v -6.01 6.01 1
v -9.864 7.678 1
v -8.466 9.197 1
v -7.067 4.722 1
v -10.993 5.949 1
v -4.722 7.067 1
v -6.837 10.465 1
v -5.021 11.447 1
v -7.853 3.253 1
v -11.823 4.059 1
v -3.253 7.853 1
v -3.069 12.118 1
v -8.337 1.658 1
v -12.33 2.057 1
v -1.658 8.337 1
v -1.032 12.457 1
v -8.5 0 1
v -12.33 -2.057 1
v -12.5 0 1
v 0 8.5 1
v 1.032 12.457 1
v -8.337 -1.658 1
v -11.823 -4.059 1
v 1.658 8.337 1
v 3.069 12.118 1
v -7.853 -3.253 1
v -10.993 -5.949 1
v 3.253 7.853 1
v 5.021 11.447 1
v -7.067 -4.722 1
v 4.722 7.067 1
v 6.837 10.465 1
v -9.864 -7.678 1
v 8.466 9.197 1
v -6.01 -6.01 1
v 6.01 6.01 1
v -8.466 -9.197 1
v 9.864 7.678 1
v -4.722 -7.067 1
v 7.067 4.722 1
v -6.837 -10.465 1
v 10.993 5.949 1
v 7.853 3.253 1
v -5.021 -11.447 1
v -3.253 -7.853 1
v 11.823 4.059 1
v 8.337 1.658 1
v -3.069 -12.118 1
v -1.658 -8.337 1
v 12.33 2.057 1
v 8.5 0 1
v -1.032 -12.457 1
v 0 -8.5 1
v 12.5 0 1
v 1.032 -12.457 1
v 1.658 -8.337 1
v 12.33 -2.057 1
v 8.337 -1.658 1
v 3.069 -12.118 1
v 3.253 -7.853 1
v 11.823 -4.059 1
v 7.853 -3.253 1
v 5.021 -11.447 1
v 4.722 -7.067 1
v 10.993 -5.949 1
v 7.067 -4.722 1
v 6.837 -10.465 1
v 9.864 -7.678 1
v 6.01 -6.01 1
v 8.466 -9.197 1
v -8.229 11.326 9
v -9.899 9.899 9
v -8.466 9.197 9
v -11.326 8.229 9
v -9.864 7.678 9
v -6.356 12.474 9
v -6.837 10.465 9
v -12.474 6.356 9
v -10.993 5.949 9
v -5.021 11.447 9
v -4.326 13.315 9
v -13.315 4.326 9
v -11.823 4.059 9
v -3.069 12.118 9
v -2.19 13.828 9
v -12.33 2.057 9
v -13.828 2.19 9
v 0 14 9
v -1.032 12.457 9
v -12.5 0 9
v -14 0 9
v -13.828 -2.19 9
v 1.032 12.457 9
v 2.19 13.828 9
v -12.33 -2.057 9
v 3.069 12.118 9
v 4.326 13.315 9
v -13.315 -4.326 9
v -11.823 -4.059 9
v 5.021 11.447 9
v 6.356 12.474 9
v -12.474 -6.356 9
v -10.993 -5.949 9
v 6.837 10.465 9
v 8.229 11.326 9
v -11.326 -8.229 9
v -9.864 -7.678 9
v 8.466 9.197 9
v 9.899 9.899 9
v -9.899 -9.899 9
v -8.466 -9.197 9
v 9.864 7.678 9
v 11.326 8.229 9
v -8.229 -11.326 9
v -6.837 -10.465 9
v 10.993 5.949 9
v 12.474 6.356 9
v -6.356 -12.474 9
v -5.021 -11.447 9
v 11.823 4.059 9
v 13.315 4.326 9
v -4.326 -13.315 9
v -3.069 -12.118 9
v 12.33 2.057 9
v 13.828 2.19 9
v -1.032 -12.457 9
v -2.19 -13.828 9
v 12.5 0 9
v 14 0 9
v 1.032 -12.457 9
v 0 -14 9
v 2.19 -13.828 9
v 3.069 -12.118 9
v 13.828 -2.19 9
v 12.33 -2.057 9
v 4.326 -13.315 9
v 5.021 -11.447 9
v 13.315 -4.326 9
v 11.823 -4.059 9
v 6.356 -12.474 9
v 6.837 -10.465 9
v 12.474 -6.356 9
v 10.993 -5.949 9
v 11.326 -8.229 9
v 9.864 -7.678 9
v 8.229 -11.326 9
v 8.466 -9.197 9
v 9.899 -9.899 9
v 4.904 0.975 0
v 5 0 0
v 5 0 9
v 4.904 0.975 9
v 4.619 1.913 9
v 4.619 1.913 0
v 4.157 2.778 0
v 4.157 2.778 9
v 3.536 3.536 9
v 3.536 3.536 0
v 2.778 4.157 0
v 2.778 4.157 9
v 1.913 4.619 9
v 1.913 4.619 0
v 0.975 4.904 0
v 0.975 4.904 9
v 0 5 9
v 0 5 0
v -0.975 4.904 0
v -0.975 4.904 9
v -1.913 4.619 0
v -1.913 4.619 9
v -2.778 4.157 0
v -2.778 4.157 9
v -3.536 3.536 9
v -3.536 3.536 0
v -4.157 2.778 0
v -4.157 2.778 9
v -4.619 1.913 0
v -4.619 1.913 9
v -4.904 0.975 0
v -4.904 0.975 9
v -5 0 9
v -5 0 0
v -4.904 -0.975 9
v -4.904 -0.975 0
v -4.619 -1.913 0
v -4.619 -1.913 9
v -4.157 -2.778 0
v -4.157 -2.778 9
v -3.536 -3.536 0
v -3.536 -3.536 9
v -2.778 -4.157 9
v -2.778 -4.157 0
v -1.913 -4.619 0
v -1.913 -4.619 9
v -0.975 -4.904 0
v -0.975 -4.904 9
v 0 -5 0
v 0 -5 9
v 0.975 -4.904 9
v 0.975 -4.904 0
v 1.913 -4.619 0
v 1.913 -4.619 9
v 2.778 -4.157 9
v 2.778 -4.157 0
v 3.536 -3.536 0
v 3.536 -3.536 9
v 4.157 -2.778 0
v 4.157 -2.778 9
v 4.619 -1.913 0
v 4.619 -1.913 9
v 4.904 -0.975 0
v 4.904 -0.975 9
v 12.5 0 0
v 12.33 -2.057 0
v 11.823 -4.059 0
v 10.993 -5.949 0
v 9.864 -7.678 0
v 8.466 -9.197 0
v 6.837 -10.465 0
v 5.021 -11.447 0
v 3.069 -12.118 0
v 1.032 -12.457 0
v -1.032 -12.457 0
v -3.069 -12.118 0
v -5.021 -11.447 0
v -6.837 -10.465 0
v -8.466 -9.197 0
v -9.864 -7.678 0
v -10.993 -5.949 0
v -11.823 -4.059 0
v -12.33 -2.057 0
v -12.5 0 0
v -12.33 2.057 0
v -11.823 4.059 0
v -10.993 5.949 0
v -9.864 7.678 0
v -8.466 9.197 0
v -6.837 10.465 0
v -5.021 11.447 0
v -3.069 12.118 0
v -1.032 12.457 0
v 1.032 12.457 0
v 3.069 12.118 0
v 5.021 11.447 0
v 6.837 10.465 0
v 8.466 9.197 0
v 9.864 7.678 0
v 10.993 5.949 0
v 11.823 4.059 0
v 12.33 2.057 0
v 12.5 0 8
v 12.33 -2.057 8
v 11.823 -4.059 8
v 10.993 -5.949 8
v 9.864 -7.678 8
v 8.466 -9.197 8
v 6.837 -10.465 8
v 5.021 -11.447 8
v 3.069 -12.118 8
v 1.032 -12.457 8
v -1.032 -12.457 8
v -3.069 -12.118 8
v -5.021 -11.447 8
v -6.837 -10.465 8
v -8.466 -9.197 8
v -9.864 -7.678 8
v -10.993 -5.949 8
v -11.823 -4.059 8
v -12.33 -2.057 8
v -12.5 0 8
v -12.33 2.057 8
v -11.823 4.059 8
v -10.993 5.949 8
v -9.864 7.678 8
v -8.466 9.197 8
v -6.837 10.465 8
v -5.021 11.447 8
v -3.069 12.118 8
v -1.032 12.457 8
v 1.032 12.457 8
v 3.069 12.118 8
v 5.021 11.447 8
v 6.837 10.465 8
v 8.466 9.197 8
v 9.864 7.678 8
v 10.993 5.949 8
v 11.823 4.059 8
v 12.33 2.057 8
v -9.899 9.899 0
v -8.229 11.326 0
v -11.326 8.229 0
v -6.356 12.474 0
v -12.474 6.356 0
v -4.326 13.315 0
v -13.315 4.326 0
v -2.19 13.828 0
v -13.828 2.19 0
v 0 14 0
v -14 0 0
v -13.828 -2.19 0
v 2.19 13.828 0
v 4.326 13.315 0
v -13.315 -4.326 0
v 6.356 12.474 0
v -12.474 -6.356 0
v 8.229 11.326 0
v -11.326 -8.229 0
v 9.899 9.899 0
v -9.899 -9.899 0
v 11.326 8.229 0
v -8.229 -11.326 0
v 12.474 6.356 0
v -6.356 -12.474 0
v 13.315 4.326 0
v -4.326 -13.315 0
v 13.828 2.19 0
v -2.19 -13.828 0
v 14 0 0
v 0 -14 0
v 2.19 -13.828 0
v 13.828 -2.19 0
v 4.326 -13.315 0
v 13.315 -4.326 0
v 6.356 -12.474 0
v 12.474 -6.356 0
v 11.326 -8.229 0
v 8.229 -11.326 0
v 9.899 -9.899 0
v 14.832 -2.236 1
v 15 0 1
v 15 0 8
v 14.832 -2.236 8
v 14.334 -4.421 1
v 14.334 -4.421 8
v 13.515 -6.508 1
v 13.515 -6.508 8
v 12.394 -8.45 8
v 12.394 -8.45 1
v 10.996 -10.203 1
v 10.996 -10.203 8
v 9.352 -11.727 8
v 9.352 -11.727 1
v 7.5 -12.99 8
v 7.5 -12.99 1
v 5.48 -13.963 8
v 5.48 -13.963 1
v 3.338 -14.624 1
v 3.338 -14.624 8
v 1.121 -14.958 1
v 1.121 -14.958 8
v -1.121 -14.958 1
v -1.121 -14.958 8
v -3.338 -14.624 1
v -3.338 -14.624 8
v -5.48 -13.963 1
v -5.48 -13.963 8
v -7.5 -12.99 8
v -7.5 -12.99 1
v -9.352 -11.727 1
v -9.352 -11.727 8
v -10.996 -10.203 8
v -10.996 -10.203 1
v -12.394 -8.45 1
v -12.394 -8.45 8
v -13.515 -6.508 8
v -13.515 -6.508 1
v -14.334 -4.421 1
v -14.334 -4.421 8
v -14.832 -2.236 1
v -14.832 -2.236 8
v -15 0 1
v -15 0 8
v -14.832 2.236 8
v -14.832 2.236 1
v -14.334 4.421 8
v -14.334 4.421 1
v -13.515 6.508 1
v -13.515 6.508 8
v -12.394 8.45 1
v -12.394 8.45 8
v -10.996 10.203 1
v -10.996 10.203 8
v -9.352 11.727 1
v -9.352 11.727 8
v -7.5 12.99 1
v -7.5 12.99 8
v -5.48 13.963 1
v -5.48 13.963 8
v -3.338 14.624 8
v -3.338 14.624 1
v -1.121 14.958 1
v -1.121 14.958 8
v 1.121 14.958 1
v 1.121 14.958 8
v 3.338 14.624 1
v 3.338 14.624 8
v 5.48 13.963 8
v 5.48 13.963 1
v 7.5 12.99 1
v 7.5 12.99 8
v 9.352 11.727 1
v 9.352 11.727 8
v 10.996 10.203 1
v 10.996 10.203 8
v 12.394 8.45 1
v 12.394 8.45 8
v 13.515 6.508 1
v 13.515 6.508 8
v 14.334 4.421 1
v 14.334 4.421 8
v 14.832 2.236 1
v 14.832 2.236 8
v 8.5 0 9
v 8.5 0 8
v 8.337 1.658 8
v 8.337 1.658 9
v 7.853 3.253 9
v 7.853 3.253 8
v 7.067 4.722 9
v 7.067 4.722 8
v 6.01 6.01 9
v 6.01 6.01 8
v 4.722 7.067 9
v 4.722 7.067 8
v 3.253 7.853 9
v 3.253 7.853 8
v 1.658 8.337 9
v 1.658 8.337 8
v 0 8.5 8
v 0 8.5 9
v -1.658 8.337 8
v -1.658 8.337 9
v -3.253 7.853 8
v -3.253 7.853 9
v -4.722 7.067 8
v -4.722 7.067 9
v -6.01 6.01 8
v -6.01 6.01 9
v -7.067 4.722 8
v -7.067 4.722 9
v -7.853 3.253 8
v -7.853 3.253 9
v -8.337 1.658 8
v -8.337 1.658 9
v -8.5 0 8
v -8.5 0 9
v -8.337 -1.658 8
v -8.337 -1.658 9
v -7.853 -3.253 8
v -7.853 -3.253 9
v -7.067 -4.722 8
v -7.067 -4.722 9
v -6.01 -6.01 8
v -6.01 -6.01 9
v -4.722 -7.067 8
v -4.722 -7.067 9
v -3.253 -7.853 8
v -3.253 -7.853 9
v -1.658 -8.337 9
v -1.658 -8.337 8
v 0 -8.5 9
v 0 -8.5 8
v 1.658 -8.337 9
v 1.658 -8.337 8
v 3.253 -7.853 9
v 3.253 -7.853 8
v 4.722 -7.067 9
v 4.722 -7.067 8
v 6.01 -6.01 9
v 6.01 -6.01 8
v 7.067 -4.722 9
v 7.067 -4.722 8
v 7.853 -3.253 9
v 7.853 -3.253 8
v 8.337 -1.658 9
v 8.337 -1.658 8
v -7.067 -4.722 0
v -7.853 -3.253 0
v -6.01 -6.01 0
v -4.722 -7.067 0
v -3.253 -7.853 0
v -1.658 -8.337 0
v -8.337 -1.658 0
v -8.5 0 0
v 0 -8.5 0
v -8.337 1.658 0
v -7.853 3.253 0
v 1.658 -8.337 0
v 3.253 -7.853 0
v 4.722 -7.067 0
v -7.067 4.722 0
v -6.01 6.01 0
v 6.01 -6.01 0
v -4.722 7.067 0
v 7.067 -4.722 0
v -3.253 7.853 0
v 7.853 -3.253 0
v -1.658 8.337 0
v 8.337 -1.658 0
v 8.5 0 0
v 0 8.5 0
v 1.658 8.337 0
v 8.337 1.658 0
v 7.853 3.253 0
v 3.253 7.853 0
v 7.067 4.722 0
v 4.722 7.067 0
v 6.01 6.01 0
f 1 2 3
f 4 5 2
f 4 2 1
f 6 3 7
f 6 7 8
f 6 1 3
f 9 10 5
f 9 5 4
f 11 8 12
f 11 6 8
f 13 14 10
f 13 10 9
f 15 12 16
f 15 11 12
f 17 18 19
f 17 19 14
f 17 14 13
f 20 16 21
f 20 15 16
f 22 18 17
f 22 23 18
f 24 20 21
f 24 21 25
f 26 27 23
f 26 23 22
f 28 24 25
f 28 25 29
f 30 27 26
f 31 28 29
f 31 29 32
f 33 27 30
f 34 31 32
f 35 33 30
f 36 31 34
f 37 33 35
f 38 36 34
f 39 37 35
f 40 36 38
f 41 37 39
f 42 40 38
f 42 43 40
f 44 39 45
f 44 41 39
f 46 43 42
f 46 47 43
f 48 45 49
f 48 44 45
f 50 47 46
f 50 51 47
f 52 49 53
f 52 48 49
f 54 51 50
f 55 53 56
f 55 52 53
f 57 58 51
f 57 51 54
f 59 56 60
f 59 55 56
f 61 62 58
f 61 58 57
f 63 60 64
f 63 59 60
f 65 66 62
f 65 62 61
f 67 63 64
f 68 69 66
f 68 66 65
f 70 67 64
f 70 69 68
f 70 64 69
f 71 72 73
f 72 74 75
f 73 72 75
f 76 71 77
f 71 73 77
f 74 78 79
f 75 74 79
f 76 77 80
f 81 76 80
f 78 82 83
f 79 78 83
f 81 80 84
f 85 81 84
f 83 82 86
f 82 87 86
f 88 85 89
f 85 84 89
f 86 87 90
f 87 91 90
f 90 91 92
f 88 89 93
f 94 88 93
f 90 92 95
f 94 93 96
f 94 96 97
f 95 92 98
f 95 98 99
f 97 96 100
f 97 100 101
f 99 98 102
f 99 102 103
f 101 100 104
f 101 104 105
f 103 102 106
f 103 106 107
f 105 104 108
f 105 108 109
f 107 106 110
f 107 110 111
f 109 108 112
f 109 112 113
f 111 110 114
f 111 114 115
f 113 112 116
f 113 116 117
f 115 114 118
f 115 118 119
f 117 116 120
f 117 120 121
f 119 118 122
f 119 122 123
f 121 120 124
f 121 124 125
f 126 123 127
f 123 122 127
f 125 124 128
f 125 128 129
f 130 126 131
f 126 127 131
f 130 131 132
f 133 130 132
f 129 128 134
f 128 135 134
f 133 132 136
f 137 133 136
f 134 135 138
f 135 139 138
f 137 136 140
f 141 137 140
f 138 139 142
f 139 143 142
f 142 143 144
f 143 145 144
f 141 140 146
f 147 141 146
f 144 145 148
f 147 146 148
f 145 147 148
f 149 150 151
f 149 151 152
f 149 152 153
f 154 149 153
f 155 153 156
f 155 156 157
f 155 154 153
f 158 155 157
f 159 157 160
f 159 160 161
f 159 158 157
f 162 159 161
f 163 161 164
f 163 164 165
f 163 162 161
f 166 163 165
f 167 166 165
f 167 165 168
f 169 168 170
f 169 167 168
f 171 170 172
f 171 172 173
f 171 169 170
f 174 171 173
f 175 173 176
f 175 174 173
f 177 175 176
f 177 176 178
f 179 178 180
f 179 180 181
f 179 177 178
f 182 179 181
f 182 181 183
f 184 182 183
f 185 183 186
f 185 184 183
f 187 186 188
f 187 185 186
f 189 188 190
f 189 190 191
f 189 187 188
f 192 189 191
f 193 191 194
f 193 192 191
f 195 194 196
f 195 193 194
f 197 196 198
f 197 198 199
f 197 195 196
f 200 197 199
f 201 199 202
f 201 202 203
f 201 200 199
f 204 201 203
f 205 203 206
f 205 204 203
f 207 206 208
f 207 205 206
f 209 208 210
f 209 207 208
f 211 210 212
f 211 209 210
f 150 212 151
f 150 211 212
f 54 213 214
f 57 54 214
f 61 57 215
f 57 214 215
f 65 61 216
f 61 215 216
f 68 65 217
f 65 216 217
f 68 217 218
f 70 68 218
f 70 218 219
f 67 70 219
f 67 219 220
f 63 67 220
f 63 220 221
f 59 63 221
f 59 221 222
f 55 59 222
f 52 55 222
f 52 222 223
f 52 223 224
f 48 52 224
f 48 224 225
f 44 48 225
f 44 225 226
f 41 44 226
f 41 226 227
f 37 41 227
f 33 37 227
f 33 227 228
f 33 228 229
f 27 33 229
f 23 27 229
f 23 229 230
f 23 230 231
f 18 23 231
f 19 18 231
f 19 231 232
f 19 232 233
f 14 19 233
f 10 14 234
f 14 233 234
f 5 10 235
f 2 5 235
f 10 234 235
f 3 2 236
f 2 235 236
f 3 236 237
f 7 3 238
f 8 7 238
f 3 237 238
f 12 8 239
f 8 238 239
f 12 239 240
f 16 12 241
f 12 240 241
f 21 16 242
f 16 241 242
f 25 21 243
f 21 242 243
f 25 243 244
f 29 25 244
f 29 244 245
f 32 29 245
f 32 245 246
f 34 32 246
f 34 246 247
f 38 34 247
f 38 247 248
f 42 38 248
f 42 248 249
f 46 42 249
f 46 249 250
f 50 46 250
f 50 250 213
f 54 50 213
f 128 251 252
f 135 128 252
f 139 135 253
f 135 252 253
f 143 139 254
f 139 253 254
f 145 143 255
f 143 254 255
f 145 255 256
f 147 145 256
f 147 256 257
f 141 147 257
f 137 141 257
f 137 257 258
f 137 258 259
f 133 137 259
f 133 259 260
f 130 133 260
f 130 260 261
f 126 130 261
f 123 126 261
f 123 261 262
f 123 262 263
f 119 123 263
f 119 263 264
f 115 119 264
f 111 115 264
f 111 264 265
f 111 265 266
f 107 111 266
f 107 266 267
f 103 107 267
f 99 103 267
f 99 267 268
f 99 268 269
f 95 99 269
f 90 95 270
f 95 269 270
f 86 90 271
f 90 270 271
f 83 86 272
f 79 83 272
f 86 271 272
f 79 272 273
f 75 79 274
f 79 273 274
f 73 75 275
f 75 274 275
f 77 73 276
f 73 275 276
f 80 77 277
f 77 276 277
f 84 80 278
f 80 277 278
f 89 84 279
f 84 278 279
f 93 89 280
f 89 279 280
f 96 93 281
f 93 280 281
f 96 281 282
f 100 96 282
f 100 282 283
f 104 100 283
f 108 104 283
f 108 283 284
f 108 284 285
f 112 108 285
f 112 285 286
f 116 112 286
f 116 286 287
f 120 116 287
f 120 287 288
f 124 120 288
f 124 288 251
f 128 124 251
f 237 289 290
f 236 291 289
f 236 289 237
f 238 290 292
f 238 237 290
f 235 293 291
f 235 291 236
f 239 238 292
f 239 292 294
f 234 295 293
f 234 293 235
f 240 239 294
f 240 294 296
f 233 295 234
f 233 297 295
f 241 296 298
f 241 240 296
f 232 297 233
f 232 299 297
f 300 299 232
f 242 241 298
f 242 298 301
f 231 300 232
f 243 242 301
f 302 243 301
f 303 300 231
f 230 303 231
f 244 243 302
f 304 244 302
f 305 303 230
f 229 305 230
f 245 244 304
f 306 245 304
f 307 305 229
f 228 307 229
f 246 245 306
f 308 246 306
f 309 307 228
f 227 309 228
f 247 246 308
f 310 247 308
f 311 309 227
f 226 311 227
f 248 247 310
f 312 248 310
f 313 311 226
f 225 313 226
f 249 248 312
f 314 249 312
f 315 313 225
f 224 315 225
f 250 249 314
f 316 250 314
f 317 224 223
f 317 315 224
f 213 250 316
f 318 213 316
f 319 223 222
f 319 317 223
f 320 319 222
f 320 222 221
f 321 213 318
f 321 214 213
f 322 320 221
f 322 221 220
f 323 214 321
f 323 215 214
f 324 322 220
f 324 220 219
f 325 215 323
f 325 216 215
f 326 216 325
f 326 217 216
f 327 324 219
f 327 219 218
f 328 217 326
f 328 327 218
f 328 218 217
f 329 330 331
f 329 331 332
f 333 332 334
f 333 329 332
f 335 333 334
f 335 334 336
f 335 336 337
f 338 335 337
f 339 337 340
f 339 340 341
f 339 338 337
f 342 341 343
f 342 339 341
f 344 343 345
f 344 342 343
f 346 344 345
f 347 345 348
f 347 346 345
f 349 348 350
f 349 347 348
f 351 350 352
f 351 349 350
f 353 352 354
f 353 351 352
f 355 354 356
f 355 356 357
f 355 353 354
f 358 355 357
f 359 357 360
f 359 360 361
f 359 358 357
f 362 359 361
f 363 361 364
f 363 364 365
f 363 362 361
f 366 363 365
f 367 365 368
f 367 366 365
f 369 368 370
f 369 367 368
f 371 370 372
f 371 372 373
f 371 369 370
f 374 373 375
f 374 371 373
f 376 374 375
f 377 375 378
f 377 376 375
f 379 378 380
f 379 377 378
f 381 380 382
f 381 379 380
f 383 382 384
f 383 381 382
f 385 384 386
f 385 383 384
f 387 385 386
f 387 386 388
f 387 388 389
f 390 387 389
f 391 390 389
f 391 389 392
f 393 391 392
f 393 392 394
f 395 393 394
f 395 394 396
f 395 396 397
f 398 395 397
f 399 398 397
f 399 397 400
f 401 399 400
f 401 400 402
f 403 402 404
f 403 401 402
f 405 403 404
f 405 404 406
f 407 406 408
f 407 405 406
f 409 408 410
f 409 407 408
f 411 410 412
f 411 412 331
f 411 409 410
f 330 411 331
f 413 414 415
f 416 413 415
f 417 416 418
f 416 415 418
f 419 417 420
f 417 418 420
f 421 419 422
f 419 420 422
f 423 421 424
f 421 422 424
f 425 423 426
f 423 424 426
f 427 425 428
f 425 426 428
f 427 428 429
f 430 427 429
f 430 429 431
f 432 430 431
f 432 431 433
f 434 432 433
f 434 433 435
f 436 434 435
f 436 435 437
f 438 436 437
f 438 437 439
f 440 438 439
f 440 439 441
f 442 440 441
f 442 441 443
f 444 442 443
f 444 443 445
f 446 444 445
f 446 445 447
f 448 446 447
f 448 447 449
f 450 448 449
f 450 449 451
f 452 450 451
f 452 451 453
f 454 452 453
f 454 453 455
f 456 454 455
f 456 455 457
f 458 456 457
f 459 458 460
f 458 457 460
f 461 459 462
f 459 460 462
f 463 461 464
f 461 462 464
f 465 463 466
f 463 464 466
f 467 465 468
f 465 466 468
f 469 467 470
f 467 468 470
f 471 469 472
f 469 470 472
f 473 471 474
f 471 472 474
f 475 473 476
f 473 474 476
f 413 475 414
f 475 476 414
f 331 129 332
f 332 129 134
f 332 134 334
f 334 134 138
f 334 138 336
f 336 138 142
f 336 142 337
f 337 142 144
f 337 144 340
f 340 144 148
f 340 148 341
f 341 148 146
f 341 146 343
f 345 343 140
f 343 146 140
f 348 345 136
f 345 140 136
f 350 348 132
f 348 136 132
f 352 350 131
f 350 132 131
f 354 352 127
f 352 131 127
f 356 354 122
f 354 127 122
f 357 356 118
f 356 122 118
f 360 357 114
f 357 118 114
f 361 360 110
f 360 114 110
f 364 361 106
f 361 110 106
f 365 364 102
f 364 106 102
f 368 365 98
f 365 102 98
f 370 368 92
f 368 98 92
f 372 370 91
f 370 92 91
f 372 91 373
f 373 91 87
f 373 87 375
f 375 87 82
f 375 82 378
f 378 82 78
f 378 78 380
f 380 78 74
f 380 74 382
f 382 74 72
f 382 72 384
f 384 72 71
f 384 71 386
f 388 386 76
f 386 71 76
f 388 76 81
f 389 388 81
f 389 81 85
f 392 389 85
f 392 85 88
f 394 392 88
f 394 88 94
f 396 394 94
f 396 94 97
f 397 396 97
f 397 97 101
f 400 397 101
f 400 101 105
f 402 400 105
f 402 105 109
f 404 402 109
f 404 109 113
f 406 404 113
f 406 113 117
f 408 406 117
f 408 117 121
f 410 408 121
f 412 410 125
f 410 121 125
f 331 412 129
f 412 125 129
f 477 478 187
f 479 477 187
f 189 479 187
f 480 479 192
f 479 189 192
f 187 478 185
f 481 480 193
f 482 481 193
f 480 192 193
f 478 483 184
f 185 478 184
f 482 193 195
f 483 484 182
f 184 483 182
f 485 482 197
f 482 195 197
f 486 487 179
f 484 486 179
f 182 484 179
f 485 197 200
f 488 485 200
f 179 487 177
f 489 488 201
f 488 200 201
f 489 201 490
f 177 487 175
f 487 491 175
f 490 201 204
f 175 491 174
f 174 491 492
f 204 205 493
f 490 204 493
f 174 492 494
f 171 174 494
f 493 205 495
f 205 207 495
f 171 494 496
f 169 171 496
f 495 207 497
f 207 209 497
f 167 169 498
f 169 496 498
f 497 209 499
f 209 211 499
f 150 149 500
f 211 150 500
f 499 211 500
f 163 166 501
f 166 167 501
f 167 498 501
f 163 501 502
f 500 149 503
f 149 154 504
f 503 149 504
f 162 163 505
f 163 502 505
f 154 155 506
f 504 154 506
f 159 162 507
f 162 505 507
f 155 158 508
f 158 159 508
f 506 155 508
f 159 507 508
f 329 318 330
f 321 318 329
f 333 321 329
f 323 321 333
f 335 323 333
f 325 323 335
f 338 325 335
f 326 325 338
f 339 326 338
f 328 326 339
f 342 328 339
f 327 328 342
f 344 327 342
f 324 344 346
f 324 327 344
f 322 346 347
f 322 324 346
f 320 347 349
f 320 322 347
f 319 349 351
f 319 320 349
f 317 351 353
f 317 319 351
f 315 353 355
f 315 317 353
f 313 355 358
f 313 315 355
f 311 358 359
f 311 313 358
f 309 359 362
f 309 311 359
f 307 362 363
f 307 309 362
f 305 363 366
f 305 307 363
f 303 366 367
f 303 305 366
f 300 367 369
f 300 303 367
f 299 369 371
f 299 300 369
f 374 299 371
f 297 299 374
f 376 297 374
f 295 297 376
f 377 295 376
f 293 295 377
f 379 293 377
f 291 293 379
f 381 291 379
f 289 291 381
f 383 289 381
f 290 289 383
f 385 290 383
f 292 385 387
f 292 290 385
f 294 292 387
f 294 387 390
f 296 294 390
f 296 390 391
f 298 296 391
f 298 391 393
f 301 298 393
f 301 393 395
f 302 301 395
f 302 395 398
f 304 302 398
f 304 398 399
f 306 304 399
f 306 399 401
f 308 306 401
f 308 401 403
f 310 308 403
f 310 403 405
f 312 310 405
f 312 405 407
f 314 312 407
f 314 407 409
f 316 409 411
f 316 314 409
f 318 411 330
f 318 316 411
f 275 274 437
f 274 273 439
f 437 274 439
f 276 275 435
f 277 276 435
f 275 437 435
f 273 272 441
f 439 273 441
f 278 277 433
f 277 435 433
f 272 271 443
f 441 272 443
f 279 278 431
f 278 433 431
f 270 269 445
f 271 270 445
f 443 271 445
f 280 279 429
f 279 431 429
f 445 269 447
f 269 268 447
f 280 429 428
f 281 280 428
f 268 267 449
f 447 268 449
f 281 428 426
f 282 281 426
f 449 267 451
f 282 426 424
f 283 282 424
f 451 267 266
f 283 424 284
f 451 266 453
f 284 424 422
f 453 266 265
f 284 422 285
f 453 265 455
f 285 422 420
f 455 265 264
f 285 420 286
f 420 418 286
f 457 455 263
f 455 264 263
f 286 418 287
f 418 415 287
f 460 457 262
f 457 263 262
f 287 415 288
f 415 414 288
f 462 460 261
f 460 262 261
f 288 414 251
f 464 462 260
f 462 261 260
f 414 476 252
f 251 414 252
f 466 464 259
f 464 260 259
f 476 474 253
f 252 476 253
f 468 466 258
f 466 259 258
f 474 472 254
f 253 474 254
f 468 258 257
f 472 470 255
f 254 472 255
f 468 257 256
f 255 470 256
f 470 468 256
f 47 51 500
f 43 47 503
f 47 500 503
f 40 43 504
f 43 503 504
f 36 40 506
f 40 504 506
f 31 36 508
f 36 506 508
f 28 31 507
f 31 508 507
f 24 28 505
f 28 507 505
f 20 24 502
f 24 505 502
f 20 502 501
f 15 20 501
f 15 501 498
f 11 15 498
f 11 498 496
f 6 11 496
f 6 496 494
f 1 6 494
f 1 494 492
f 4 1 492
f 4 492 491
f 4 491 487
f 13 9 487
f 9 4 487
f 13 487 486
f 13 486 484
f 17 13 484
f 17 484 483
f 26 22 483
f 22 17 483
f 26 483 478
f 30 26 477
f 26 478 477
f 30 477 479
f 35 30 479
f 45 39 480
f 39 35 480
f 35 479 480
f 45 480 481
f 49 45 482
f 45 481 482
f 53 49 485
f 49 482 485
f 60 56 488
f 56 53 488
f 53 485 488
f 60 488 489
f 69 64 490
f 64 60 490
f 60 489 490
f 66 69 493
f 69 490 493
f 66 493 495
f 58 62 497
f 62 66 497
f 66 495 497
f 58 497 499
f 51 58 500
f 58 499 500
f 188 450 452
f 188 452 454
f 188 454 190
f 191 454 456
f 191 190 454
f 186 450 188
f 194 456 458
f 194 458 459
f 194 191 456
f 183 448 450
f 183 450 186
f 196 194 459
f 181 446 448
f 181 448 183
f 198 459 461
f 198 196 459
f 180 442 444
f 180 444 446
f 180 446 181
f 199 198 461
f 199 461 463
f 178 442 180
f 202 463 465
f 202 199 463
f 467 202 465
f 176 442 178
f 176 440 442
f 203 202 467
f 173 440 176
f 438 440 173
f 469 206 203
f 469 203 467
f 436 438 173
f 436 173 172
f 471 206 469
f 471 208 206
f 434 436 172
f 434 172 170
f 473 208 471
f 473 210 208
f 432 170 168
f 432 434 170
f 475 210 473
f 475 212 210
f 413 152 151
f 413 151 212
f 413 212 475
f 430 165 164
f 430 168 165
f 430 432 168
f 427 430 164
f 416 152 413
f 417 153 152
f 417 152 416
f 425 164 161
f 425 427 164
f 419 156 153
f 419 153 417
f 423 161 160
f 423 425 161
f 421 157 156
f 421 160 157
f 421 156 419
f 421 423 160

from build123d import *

# Parameters (mm, degrees)
SKETCH_R      = 8.5
SKETCH_R_2    = 5
PAD_DEPTH     = 9
SKETCH001_R   = 12.5
SKETCH001_R_2 = 8.5
PAD001_DEPTH  = 7
SKETCH002_R   = 15
SKETCH002_R_2 = 12.5
PAD002_DEPTH  = 9
CHAMFER_SIZE  = 1


with BuildPart() as part:
    # Sketch → Pad (new body)
    with BuildSketch(Plane.XY):
        Circle(SKETCH_R)
        Circle(SKETCH_R_2, mode=Mode.SUBTRACT)
    extrude(amount=PAD_DEPTH)

    # Sketch001 (on Face3 of Pad) → Pad001 (join)
    with BuildSketch(Plane(origin=(0, 0, 1), x_dir=(1, 0, 0), z_dir=(0, 0, -1))):
        Circle(SKETCH001_R)
        Circle(SKETCH001_R_2, mode=Mode.SUBTRACT)
    extrude(amount=-PAD001_DEPTH)

    # Sketch002 (on Face2 of Pad001) → Pad002 (join)
    with BuildSketch(Plane(origin=(0, 0, 0), x_dir=(1, 0, 0), z_dir=(0, 0, -1))):
        Circle(SKETCH002_R)
        Circle(SKETCH002_R_2, mode=Mode.SUBTRACT)
    extrude(amount=-PAD002_DEPTH)

    # Chamfer
    chamfer_edges = [part.edges().sort_by_distance(p)[0] for p in [
        (-15, 0, 9),
        (-15, 0, 0),
    ]]
    chamfer(chamfer_edges, length=CHAMFER_SIZE)


solid = part.part
